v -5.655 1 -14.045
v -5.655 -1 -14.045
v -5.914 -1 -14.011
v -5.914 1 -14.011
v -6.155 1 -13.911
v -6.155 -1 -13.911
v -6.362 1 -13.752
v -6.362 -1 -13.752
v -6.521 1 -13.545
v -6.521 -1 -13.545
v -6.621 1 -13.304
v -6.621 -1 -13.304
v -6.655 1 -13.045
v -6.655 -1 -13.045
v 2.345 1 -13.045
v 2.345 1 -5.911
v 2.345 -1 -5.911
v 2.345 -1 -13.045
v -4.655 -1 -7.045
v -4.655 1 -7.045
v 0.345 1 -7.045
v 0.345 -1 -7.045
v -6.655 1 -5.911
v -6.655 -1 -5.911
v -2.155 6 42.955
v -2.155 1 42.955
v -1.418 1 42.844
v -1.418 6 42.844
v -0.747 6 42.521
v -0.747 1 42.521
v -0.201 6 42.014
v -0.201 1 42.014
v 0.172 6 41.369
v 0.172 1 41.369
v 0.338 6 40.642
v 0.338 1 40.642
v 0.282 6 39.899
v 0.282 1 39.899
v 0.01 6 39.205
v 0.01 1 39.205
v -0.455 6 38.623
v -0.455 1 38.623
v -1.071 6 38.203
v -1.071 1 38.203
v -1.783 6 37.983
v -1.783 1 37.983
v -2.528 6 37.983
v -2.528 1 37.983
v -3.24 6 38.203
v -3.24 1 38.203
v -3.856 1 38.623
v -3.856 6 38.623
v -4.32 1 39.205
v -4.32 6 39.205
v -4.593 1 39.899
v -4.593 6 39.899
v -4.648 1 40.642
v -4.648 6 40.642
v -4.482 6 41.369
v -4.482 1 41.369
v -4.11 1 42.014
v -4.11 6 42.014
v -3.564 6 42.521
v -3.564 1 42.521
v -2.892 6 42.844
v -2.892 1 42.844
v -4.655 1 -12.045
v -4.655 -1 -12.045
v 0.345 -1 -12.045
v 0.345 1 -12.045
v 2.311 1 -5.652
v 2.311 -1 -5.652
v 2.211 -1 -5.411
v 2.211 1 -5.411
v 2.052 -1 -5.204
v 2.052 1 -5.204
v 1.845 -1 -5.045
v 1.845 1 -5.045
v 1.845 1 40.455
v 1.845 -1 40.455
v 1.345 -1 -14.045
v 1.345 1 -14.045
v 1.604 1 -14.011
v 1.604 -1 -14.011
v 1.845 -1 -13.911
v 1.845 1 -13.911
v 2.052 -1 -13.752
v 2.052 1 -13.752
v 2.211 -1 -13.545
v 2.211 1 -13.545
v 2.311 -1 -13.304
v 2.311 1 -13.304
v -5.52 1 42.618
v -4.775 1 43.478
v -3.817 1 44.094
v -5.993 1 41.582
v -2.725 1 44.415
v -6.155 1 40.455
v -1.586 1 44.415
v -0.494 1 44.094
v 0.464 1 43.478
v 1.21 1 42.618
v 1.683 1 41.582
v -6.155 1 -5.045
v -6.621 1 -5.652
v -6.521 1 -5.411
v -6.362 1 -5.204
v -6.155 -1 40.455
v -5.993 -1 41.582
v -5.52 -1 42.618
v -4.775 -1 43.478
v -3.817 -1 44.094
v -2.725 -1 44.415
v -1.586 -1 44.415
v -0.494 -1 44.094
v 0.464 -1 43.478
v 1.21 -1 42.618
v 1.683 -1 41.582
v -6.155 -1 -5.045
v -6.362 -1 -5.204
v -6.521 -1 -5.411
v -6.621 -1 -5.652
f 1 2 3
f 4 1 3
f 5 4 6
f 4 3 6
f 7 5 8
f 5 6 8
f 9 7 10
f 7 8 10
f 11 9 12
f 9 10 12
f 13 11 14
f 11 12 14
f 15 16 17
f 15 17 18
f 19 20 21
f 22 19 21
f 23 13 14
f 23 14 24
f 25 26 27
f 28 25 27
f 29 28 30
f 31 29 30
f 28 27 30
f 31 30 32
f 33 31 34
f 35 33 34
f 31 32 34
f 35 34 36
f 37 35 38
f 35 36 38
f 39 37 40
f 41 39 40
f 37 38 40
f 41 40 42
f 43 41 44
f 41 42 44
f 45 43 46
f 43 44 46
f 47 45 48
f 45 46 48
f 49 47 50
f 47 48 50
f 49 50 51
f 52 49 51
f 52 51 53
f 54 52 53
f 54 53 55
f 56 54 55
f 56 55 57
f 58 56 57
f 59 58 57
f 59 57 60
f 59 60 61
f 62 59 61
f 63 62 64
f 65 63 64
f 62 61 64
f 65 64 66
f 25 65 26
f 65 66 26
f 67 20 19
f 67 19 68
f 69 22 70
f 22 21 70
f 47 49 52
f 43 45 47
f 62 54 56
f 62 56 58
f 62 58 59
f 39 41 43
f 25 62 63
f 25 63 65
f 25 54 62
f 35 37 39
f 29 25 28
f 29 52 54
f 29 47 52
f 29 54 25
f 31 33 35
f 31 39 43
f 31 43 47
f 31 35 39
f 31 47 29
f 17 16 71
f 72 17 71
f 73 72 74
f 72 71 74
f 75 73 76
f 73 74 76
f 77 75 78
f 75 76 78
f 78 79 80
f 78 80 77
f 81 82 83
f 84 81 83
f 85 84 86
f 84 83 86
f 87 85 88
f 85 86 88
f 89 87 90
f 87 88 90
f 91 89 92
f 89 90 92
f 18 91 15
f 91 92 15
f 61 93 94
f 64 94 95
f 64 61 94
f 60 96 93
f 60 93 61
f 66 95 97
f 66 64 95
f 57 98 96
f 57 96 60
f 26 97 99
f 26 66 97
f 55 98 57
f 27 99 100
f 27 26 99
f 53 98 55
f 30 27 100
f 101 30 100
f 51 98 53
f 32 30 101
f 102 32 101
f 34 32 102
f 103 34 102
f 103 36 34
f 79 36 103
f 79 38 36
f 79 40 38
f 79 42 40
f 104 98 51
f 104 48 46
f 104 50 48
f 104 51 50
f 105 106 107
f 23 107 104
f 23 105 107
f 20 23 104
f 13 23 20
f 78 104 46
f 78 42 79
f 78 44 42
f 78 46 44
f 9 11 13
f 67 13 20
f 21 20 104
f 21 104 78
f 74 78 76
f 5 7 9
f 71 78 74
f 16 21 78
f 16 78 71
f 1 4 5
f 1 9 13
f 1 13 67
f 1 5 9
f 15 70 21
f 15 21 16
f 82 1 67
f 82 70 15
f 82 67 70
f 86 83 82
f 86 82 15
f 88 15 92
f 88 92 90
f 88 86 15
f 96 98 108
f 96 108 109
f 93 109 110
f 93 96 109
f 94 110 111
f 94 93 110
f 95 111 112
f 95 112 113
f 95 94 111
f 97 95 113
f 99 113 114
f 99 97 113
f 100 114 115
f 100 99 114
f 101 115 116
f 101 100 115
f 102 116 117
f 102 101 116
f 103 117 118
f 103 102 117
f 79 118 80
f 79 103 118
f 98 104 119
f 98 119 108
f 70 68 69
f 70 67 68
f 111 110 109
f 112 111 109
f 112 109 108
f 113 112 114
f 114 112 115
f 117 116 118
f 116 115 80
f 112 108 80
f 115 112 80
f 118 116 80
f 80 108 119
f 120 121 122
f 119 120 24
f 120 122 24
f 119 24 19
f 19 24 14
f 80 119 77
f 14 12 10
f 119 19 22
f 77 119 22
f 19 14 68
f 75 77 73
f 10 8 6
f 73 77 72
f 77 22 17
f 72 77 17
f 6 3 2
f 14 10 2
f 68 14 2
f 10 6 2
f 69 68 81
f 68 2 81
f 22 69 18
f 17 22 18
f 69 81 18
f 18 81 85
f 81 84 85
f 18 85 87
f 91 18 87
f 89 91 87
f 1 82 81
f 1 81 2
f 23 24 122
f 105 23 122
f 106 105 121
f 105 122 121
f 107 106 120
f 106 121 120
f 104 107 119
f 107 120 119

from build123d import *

# Parameters (mm, degrees)
SKETCH1_W           = 5
SKETCH1_H           = 5
BOSS_EXTRUDE1_DEPTH = 1
FILLET1_R           = 1
SKETCH2_R           = 2.5
BOSS_EXTRUDE2_DEPTH = 5


with BuildPart() as part:
    # Sketch1 → Boss-Extrude1 (new, symmetric)
    # profile 1 of 2: a face of its own
    with BuildSketch(Plane(origin=(0, 0, 0), x_dir=(1, 0, 0), z_dir=(0, 1, 0))):
        with BuildLine():
            Line((1.844736842, 5.044736842), (-6.155263158, 5.044736842))
            Line((-6.155263158, 5.044736842), (-6.155263158, -40.455263158))
            ThreePointArc((-6.155263158, -40.455263158), (-2.155263158, -44.455263158), (1.844736842, -40.455263158))
            Line((1.844736842, -40.455263158), (1.844736842, 5.044736842))
        make_face()
    # profile 2 of 2: a face of its own
    with BuildSketch(Plane(origin=(0, 0, 0), x_dir=(1, 0, 0), z_dir=(0, 1, 0))):
        Polygon((-6.655263158, 5.044736842), (-6.155263158, 5.044736842), (1.844736842, 5.044736842), (2.344736842, 5.044736842), (2.344736842, 14.044736842), (-6.655263158, 14.044736842), align=None)
        with Locations((-2.155263158, 9.544736842)):
            Rectangle(SKETCH1_W, SKETCH1_H, mode=Mode.SUBTRACT)
    extrude(amount=BOSS_EXTRUDE1_DEPTH, both=True)

    # Fillet1
    # the kernel refuses this fillet: 1 mm, written as the material it takes off along each edge
    with BuildSketch(Plane(origin=(2.344736842, 3.165063509, -5.044736842), x_dir=(0, 0, -1), z_dir=(0, -1, 0)), Plane(origin=(-6.655263158, -3.165063509, -5.044736842), x_dir=(0, 0, -1), z_dir=(0, 1, 0))) as fillet1_piece_1:
        with BuildLine():
            CenterArc((0.866025404, -1), FILLET1_R, 90, 60)
            Line((0, -0.5), (-0.017320508, -0.49))
            ThreePointArc((-0.017320508, -0.49), (-0.02, -0.25), (-0.02, 0))
            Line((-0.02, 0), (0, 0.02))
            Line((0, 0.02), (0.866025404, 0.02))
            Line((0.866025404, 0.02), (0.866025404, 0))
        make_face()
    extrude(amount=6.330127019, mode=Mode.SUBTRACT)
    with BuildSketch(Plane(origin=(2.344736842, 3.5, -14.044736842), x_dir=(-1, 0, 0), z_dir=(0, -1, 0)), Plane(origin=(-6.655263158, -3.5, -14.044736842), x_dir=(1, 0, 0), z_dir=(0, 1, 0))) as fillet1_piece_2:
        with BuildLine():
            CenterArc((FILLET1_R, -FILLET1_R), FILLET1_R, 90, 90)
            Line((0, -FILLET1_R), (-FILLET1_R * 0.02, -FILLET1_R))
            Line((-FILLET1_R * 0.02, -FILLET1_R), (-FILLET1_R * 0.02, FILLET1_R * 0.02))
            Line((-FILLET1_R * 0.02, FILLET1_R * 0.02), (FILLET1_R, FILLET1_R * 0.02))
            Line((FILLET1_R, FILLET1_R * 0.02), (FILLET1_R, 0))
        make_face()
    extrude(amount=7, mode=Mode.SUBTRACT)

    # Sketch2 → Boss-Extrude2 (add)
    with BuildSketch(Plane(origin=(0, 1, 0), x_dir=(1, 0, 0), z_dir=(0, 1, 0))):
        with Locations(Location((-2.155263158, -40.455263158, 0), (0, 0, 270))):
            Circle(SKETCH2_R)
    extrude(amount=BOSS_EXTRUDE2_DEPTH)


solid = part.part
